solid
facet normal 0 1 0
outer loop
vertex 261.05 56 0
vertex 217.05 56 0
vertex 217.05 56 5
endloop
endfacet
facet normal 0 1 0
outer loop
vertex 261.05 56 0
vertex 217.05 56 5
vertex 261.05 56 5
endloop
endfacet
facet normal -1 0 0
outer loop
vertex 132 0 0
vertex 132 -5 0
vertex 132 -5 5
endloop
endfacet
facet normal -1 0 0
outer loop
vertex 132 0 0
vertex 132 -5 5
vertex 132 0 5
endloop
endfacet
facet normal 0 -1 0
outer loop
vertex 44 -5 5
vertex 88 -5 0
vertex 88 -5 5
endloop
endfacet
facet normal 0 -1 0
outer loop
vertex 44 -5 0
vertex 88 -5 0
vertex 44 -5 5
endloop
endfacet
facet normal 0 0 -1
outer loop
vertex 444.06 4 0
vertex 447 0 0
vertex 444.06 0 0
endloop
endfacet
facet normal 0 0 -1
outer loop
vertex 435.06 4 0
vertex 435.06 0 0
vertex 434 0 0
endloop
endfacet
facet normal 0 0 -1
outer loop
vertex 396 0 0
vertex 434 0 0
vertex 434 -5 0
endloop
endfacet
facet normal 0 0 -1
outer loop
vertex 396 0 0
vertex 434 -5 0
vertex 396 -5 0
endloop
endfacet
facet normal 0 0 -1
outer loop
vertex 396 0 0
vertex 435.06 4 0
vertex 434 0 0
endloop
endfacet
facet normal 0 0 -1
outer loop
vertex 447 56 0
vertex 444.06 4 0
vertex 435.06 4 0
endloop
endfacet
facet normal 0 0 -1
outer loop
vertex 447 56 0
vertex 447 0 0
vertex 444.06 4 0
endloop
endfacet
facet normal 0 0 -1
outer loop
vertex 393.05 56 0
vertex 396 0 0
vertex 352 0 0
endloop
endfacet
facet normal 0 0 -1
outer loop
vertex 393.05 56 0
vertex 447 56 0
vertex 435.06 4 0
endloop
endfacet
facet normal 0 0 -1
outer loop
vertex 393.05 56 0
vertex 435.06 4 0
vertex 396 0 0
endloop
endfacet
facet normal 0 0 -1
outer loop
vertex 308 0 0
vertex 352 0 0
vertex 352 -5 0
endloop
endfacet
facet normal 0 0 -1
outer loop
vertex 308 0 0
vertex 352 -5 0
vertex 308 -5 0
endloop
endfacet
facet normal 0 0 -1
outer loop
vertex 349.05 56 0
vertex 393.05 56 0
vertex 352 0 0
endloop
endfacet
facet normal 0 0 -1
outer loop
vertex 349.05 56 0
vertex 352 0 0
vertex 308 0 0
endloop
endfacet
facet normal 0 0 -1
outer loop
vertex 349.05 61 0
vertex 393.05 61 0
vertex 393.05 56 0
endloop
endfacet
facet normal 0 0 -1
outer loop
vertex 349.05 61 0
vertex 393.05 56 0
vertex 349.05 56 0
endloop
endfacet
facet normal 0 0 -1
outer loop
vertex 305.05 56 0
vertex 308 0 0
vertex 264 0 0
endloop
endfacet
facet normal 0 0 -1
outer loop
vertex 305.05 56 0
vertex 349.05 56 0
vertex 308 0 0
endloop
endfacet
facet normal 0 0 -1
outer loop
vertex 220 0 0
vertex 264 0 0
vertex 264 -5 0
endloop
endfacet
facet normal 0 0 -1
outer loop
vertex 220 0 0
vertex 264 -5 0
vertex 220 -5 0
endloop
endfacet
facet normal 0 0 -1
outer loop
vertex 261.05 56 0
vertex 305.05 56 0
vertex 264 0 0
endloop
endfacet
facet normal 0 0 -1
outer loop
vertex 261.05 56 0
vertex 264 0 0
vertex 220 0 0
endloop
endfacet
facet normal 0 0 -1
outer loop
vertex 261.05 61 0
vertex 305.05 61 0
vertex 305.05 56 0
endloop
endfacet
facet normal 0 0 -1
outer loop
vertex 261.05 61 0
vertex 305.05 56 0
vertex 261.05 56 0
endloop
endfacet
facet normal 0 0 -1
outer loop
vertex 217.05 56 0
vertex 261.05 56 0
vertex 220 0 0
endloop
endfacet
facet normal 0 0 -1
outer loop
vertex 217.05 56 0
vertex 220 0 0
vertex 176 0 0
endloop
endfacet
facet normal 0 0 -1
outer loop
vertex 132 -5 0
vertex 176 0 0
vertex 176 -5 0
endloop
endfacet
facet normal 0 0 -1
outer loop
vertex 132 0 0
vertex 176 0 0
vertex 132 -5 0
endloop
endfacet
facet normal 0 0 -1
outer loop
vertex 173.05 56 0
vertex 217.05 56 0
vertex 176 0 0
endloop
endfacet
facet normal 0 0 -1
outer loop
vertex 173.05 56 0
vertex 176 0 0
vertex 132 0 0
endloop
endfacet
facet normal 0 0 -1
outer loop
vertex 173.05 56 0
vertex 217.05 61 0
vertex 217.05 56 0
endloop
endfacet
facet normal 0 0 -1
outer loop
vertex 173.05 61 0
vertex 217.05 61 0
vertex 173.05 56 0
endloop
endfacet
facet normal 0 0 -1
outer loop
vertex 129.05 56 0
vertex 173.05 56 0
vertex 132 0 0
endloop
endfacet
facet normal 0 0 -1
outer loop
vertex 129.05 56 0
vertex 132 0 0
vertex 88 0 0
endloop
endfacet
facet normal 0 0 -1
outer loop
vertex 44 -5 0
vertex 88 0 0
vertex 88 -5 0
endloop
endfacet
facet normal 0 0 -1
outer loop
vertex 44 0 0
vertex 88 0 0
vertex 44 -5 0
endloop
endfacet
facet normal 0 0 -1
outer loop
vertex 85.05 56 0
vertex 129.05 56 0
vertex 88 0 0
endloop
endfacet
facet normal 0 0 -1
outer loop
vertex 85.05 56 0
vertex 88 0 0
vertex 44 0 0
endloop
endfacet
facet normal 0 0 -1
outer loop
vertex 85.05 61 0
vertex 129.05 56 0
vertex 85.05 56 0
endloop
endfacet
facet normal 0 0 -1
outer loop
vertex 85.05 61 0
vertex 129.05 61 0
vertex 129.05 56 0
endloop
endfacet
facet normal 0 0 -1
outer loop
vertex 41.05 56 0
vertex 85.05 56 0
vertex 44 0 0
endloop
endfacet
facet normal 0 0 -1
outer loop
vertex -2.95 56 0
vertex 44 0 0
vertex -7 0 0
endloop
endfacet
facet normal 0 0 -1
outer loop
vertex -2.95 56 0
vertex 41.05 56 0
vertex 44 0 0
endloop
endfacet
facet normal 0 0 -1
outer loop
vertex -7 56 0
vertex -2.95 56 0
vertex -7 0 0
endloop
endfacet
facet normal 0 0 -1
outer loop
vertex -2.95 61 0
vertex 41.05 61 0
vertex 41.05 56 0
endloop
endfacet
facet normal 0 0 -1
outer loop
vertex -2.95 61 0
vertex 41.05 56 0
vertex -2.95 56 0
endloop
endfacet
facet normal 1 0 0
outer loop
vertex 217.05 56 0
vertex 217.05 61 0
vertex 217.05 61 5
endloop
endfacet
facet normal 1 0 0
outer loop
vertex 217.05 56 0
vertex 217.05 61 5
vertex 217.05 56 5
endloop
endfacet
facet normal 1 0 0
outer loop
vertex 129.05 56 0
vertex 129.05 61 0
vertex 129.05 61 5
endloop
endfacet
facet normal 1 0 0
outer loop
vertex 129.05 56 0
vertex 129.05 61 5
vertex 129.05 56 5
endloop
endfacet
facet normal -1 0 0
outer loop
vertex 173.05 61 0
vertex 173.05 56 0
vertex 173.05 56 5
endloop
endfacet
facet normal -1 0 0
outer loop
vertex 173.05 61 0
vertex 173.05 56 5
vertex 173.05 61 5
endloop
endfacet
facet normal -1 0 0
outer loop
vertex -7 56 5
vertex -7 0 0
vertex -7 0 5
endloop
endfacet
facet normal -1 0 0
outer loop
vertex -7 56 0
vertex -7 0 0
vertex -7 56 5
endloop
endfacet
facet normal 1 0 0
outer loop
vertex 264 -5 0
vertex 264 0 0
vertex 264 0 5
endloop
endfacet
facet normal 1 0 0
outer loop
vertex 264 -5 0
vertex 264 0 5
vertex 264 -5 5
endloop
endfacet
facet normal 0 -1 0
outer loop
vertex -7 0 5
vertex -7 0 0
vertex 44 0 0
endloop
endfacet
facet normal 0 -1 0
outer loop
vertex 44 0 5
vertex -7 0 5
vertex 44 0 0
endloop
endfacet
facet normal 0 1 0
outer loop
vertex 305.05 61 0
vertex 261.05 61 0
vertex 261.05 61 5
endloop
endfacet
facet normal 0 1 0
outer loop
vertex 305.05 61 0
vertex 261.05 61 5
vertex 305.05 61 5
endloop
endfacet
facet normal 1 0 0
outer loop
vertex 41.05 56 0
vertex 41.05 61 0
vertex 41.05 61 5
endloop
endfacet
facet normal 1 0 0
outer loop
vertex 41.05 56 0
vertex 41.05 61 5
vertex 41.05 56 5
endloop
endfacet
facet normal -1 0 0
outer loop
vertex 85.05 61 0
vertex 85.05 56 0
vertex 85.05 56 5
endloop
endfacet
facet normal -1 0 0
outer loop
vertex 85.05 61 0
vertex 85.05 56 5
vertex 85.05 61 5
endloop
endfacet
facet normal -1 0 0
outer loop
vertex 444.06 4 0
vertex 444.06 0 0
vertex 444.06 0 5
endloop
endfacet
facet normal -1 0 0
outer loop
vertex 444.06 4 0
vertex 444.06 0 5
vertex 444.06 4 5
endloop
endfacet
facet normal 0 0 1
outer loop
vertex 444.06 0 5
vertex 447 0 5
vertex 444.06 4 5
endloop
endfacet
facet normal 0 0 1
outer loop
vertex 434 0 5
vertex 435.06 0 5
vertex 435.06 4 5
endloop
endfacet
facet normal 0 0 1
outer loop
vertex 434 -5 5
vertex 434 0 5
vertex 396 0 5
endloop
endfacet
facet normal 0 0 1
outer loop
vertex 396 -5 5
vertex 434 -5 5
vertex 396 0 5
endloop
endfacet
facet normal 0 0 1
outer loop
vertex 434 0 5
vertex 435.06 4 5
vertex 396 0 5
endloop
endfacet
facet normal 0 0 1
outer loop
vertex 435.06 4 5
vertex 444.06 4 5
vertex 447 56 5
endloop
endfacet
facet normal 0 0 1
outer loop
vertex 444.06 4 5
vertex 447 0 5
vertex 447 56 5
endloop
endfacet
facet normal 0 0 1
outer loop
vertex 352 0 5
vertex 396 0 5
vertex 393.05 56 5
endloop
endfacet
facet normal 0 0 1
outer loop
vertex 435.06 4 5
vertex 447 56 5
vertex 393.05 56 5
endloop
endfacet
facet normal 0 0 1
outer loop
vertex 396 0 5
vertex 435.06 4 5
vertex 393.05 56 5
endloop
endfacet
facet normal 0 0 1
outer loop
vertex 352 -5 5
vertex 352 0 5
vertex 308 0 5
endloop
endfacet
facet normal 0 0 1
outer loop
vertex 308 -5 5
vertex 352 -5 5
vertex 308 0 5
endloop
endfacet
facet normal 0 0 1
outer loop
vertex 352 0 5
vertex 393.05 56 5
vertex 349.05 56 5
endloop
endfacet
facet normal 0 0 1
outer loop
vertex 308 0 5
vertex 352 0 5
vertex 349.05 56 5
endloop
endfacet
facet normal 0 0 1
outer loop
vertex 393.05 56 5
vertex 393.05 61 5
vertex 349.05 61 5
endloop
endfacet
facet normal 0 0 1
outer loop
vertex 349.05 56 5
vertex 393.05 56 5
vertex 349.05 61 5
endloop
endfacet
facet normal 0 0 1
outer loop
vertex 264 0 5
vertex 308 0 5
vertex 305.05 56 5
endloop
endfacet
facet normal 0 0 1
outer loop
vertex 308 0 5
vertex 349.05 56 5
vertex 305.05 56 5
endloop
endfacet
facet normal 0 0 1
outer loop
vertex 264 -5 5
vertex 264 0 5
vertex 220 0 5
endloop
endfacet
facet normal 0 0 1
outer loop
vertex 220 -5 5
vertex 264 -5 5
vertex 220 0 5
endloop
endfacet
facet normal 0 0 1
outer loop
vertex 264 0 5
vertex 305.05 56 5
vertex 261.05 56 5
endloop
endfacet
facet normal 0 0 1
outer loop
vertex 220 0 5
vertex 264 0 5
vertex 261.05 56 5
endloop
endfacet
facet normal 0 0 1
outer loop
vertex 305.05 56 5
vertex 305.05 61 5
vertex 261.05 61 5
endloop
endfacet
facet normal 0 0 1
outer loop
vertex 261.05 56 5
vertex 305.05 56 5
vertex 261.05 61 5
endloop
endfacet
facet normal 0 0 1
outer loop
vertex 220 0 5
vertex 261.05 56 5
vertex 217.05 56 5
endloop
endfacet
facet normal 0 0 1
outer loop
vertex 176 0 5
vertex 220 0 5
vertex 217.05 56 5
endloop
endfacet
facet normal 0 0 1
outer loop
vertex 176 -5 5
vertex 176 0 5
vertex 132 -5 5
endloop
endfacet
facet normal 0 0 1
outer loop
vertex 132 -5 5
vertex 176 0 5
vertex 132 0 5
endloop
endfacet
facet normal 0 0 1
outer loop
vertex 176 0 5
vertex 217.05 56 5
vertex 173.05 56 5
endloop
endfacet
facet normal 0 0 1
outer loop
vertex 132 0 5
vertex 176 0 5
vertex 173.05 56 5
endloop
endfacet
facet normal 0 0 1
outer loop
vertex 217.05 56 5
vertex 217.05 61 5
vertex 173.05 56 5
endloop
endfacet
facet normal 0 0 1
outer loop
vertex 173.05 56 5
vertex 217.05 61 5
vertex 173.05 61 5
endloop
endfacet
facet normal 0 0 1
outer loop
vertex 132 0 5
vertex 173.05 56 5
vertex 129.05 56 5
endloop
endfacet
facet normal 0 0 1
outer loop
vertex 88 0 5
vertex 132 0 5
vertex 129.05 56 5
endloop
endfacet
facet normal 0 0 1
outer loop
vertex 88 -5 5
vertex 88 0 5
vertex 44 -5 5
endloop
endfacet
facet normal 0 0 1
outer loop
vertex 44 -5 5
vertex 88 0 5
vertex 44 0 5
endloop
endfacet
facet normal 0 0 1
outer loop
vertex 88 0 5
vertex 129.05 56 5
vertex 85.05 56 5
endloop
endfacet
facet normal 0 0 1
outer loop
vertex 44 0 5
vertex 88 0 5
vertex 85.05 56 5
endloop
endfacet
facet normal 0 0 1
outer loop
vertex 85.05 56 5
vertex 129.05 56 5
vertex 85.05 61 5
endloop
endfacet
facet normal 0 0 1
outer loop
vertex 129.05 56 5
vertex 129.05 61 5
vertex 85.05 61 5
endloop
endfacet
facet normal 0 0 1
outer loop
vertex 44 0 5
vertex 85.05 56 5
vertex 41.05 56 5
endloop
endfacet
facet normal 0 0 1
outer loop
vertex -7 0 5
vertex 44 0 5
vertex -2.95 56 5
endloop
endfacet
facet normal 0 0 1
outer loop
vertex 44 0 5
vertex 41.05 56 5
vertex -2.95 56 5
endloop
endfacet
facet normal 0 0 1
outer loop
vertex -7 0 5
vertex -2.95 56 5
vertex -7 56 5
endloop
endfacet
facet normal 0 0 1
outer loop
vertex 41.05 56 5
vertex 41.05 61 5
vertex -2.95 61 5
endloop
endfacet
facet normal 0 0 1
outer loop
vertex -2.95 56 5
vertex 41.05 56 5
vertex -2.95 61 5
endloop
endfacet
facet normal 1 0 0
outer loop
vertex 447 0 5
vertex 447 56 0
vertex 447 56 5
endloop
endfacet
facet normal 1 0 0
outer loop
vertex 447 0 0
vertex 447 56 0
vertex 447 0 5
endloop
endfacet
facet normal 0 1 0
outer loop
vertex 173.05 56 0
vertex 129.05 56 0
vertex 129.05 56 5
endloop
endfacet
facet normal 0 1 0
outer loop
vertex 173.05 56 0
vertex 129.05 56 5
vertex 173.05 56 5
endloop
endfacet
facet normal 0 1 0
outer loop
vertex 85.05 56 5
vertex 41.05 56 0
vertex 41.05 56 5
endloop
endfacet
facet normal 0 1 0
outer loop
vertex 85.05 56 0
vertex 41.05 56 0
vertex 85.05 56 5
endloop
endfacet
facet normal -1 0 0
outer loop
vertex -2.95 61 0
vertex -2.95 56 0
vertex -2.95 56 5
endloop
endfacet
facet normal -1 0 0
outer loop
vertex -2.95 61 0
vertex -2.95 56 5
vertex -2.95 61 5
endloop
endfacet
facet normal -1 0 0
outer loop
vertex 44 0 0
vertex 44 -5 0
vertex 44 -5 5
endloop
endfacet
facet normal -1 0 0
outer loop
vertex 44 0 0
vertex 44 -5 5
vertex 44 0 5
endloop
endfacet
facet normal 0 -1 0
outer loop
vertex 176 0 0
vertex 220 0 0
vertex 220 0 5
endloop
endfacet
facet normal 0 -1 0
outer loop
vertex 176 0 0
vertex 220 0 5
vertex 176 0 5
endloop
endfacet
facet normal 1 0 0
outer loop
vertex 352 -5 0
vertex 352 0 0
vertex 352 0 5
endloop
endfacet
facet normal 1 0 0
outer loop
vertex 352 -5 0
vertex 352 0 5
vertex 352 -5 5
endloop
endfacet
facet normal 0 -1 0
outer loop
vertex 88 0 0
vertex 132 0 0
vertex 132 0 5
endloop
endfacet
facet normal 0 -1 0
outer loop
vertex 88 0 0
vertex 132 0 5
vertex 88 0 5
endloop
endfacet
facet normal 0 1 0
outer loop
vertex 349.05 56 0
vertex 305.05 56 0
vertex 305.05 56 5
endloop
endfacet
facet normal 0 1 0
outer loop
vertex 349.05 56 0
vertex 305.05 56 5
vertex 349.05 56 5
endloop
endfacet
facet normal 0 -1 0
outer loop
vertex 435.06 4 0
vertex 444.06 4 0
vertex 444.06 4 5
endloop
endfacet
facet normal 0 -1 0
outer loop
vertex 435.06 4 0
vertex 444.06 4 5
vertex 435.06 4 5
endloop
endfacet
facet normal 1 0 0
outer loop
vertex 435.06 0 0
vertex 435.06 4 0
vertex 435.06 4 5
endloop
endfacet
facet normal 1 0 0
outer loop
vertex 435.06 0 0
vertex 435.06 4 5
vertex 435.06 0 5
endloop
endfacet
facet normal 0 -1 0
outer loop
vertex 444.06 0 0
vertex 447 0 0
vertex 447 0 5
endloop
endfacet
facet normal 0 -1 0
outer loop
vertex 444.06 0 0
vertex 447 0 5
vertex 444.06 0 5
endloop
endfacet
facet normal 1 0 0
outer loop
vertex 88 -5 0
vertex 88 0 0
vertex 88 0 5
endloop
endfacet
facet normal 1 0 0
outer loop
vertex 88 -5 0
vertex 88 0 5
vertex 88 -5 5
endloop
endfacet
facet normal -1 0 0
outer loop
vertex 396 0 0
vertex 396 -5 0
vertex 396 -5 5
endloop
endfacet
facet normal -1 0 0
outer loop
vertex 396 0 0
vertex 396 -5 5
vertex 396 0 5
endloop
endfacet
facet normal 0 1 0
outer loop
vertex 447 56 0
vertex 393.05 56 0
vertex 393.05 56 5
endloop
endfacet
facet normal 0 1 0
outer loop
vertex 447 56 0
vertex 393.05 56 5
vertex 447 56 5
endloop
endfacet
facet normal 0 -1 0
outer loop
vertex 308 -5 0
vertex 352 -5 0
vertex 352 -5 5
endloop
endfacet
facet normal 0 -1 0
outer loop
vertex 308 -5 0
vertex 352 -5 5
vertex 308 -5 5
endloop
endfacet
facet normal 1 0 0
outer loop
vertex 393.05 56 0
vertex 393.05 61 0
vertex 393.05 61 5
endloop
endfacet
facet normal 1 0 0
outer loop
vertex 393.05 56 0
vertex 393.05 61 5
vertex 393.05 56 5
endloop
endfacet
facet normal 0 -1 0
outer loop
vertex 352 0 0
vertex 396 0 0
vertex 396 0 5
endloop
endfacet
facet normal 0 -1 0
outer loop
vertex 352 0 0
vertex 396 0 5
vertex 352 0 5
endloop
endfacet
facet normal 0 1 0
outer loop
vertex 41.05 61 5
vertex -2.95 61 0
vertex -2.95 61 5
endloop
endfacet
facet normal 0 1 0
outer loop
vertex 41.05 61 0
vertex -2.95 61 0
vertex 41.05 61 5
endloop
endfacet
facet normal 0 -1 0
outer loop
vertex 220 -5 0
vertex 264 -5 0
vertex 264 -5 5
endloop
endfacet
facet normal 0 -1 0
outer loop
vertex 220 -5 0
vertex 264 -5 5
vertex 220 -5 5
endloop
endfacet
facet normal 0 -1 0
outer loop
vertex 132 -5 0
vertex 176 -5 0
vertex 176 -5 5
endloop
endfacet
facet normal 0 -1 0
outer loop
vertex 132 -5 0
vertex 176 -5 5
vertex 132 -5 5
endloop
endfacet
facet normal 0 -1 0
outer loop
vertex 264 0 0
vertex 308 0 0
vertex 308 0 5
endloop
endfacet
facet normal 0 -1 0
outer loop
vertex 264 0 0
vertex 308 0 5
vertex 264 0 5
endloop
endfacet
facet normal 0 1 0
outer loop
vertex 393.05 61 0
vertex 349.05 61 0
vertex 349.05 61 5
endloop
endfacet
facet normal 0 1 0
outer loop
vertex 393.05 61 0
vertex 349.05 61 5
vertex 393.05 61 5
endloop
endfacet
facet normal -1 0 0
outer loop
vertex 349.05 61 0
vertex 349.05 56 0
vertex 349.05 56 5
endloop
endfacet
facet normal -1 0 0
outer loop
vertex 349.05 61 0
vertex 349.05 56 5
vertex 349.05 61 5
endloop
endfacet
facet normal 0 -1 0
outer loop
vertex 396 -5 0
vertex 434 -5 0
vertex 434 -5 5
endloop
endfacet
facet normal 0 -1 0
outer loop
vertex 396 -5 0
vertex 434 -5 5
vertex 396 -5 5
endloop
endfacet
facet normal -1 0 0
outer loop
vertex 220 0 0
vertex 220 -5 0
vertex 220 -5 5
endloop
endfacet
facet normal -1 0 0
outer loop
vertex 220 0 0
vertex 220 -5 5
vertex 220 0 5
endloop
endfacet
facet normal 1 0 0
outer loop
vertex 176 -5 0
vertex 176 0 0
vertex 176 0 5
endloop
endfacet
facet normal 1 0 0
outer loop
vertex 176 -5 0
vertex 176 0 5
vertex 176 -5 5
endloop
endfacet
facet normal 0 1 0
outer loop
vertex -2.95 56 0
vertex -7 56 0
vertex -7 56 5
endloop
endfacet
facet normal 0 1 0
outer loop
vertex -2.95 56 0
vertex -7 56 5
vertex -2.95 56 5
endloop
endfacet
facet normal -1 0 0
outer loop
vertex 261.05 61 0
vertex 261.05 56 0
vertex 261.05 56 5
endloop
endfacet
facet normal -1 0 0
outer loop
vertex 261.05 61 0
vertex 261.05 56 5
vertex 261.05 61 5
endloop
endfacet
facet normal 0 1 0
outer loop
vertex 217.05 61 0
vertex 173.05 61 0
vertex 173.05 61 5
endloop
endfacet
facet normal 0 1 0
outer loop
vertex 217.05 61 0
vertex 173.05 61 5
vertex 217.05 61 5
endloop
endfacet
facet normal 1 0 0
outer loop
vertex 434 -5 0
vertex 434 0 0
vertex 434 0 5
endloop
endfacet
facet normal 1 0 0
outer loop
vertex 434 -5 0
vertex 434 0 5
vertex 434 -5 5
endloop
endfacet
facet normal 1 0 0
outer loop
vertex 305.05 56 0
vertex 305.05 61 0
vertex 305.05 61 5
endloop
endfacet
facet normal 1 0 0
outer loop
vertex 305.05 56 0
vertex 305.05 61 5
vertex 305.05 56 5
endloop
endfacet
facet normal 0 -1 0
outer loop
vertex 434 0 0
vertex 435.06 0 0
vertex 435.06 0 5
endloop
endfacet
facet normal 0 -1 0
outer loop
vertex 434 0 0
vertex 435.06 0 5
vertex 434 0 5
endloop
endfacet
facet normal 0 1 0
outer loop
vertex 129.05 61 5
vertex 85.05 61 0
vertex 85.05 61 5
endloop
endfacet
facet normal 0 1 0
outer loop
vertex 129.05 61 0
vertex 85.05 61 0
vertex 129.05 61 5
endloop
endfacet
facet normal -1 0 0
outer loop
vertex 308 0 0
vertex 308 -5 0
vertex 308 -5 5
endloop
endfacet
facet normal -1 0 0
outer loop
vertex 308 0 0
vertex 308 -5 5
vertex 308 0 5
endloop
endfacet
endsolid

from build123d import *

# Parameters (mm, degrees)
BOSS_EXTRUDE1_DEPTH = 5


with BuildPart() as part:
    # Sketch1 → Boss-Extrude1 (new body)
    with BuildSketch(Plane.XY):
        Polygon((305.05, 56), (349.05, 56), (349.05, 61), (393.05, 61), (393.05, 56), (447, 56), (447, 0), (444.06, 0), (444.06, 4), (435.06, 4), (435.06, 0), (434, 0), (434, -5), (396, -5), (396, 0), (352, 0), (352, -5), (308, -5), (308, 0), (264, 0), (264, -5), (220, -5), (220, 0), (176, 0), (176, -5), (132, -5), (132, 0), (88, 0), (88, -5), (44, -5), (44, 0), (0, 0), (-7, 0), (-7, 56), (-2.95, 56), (-2.95, 61), (41.05, 61), (41.05, 56), (85.05, 56), (85.05, 61), (129.05, 61), (129.05, 56), (173.05, 56), (173.05, 61), (217.05, 61), (217.05, 56), (261.05, 56), (261.05, 61), (305.05, 61), align=None)
    extrude(amount=BOSS_EXTRUDE1_DEPTH)


solid = part.part
